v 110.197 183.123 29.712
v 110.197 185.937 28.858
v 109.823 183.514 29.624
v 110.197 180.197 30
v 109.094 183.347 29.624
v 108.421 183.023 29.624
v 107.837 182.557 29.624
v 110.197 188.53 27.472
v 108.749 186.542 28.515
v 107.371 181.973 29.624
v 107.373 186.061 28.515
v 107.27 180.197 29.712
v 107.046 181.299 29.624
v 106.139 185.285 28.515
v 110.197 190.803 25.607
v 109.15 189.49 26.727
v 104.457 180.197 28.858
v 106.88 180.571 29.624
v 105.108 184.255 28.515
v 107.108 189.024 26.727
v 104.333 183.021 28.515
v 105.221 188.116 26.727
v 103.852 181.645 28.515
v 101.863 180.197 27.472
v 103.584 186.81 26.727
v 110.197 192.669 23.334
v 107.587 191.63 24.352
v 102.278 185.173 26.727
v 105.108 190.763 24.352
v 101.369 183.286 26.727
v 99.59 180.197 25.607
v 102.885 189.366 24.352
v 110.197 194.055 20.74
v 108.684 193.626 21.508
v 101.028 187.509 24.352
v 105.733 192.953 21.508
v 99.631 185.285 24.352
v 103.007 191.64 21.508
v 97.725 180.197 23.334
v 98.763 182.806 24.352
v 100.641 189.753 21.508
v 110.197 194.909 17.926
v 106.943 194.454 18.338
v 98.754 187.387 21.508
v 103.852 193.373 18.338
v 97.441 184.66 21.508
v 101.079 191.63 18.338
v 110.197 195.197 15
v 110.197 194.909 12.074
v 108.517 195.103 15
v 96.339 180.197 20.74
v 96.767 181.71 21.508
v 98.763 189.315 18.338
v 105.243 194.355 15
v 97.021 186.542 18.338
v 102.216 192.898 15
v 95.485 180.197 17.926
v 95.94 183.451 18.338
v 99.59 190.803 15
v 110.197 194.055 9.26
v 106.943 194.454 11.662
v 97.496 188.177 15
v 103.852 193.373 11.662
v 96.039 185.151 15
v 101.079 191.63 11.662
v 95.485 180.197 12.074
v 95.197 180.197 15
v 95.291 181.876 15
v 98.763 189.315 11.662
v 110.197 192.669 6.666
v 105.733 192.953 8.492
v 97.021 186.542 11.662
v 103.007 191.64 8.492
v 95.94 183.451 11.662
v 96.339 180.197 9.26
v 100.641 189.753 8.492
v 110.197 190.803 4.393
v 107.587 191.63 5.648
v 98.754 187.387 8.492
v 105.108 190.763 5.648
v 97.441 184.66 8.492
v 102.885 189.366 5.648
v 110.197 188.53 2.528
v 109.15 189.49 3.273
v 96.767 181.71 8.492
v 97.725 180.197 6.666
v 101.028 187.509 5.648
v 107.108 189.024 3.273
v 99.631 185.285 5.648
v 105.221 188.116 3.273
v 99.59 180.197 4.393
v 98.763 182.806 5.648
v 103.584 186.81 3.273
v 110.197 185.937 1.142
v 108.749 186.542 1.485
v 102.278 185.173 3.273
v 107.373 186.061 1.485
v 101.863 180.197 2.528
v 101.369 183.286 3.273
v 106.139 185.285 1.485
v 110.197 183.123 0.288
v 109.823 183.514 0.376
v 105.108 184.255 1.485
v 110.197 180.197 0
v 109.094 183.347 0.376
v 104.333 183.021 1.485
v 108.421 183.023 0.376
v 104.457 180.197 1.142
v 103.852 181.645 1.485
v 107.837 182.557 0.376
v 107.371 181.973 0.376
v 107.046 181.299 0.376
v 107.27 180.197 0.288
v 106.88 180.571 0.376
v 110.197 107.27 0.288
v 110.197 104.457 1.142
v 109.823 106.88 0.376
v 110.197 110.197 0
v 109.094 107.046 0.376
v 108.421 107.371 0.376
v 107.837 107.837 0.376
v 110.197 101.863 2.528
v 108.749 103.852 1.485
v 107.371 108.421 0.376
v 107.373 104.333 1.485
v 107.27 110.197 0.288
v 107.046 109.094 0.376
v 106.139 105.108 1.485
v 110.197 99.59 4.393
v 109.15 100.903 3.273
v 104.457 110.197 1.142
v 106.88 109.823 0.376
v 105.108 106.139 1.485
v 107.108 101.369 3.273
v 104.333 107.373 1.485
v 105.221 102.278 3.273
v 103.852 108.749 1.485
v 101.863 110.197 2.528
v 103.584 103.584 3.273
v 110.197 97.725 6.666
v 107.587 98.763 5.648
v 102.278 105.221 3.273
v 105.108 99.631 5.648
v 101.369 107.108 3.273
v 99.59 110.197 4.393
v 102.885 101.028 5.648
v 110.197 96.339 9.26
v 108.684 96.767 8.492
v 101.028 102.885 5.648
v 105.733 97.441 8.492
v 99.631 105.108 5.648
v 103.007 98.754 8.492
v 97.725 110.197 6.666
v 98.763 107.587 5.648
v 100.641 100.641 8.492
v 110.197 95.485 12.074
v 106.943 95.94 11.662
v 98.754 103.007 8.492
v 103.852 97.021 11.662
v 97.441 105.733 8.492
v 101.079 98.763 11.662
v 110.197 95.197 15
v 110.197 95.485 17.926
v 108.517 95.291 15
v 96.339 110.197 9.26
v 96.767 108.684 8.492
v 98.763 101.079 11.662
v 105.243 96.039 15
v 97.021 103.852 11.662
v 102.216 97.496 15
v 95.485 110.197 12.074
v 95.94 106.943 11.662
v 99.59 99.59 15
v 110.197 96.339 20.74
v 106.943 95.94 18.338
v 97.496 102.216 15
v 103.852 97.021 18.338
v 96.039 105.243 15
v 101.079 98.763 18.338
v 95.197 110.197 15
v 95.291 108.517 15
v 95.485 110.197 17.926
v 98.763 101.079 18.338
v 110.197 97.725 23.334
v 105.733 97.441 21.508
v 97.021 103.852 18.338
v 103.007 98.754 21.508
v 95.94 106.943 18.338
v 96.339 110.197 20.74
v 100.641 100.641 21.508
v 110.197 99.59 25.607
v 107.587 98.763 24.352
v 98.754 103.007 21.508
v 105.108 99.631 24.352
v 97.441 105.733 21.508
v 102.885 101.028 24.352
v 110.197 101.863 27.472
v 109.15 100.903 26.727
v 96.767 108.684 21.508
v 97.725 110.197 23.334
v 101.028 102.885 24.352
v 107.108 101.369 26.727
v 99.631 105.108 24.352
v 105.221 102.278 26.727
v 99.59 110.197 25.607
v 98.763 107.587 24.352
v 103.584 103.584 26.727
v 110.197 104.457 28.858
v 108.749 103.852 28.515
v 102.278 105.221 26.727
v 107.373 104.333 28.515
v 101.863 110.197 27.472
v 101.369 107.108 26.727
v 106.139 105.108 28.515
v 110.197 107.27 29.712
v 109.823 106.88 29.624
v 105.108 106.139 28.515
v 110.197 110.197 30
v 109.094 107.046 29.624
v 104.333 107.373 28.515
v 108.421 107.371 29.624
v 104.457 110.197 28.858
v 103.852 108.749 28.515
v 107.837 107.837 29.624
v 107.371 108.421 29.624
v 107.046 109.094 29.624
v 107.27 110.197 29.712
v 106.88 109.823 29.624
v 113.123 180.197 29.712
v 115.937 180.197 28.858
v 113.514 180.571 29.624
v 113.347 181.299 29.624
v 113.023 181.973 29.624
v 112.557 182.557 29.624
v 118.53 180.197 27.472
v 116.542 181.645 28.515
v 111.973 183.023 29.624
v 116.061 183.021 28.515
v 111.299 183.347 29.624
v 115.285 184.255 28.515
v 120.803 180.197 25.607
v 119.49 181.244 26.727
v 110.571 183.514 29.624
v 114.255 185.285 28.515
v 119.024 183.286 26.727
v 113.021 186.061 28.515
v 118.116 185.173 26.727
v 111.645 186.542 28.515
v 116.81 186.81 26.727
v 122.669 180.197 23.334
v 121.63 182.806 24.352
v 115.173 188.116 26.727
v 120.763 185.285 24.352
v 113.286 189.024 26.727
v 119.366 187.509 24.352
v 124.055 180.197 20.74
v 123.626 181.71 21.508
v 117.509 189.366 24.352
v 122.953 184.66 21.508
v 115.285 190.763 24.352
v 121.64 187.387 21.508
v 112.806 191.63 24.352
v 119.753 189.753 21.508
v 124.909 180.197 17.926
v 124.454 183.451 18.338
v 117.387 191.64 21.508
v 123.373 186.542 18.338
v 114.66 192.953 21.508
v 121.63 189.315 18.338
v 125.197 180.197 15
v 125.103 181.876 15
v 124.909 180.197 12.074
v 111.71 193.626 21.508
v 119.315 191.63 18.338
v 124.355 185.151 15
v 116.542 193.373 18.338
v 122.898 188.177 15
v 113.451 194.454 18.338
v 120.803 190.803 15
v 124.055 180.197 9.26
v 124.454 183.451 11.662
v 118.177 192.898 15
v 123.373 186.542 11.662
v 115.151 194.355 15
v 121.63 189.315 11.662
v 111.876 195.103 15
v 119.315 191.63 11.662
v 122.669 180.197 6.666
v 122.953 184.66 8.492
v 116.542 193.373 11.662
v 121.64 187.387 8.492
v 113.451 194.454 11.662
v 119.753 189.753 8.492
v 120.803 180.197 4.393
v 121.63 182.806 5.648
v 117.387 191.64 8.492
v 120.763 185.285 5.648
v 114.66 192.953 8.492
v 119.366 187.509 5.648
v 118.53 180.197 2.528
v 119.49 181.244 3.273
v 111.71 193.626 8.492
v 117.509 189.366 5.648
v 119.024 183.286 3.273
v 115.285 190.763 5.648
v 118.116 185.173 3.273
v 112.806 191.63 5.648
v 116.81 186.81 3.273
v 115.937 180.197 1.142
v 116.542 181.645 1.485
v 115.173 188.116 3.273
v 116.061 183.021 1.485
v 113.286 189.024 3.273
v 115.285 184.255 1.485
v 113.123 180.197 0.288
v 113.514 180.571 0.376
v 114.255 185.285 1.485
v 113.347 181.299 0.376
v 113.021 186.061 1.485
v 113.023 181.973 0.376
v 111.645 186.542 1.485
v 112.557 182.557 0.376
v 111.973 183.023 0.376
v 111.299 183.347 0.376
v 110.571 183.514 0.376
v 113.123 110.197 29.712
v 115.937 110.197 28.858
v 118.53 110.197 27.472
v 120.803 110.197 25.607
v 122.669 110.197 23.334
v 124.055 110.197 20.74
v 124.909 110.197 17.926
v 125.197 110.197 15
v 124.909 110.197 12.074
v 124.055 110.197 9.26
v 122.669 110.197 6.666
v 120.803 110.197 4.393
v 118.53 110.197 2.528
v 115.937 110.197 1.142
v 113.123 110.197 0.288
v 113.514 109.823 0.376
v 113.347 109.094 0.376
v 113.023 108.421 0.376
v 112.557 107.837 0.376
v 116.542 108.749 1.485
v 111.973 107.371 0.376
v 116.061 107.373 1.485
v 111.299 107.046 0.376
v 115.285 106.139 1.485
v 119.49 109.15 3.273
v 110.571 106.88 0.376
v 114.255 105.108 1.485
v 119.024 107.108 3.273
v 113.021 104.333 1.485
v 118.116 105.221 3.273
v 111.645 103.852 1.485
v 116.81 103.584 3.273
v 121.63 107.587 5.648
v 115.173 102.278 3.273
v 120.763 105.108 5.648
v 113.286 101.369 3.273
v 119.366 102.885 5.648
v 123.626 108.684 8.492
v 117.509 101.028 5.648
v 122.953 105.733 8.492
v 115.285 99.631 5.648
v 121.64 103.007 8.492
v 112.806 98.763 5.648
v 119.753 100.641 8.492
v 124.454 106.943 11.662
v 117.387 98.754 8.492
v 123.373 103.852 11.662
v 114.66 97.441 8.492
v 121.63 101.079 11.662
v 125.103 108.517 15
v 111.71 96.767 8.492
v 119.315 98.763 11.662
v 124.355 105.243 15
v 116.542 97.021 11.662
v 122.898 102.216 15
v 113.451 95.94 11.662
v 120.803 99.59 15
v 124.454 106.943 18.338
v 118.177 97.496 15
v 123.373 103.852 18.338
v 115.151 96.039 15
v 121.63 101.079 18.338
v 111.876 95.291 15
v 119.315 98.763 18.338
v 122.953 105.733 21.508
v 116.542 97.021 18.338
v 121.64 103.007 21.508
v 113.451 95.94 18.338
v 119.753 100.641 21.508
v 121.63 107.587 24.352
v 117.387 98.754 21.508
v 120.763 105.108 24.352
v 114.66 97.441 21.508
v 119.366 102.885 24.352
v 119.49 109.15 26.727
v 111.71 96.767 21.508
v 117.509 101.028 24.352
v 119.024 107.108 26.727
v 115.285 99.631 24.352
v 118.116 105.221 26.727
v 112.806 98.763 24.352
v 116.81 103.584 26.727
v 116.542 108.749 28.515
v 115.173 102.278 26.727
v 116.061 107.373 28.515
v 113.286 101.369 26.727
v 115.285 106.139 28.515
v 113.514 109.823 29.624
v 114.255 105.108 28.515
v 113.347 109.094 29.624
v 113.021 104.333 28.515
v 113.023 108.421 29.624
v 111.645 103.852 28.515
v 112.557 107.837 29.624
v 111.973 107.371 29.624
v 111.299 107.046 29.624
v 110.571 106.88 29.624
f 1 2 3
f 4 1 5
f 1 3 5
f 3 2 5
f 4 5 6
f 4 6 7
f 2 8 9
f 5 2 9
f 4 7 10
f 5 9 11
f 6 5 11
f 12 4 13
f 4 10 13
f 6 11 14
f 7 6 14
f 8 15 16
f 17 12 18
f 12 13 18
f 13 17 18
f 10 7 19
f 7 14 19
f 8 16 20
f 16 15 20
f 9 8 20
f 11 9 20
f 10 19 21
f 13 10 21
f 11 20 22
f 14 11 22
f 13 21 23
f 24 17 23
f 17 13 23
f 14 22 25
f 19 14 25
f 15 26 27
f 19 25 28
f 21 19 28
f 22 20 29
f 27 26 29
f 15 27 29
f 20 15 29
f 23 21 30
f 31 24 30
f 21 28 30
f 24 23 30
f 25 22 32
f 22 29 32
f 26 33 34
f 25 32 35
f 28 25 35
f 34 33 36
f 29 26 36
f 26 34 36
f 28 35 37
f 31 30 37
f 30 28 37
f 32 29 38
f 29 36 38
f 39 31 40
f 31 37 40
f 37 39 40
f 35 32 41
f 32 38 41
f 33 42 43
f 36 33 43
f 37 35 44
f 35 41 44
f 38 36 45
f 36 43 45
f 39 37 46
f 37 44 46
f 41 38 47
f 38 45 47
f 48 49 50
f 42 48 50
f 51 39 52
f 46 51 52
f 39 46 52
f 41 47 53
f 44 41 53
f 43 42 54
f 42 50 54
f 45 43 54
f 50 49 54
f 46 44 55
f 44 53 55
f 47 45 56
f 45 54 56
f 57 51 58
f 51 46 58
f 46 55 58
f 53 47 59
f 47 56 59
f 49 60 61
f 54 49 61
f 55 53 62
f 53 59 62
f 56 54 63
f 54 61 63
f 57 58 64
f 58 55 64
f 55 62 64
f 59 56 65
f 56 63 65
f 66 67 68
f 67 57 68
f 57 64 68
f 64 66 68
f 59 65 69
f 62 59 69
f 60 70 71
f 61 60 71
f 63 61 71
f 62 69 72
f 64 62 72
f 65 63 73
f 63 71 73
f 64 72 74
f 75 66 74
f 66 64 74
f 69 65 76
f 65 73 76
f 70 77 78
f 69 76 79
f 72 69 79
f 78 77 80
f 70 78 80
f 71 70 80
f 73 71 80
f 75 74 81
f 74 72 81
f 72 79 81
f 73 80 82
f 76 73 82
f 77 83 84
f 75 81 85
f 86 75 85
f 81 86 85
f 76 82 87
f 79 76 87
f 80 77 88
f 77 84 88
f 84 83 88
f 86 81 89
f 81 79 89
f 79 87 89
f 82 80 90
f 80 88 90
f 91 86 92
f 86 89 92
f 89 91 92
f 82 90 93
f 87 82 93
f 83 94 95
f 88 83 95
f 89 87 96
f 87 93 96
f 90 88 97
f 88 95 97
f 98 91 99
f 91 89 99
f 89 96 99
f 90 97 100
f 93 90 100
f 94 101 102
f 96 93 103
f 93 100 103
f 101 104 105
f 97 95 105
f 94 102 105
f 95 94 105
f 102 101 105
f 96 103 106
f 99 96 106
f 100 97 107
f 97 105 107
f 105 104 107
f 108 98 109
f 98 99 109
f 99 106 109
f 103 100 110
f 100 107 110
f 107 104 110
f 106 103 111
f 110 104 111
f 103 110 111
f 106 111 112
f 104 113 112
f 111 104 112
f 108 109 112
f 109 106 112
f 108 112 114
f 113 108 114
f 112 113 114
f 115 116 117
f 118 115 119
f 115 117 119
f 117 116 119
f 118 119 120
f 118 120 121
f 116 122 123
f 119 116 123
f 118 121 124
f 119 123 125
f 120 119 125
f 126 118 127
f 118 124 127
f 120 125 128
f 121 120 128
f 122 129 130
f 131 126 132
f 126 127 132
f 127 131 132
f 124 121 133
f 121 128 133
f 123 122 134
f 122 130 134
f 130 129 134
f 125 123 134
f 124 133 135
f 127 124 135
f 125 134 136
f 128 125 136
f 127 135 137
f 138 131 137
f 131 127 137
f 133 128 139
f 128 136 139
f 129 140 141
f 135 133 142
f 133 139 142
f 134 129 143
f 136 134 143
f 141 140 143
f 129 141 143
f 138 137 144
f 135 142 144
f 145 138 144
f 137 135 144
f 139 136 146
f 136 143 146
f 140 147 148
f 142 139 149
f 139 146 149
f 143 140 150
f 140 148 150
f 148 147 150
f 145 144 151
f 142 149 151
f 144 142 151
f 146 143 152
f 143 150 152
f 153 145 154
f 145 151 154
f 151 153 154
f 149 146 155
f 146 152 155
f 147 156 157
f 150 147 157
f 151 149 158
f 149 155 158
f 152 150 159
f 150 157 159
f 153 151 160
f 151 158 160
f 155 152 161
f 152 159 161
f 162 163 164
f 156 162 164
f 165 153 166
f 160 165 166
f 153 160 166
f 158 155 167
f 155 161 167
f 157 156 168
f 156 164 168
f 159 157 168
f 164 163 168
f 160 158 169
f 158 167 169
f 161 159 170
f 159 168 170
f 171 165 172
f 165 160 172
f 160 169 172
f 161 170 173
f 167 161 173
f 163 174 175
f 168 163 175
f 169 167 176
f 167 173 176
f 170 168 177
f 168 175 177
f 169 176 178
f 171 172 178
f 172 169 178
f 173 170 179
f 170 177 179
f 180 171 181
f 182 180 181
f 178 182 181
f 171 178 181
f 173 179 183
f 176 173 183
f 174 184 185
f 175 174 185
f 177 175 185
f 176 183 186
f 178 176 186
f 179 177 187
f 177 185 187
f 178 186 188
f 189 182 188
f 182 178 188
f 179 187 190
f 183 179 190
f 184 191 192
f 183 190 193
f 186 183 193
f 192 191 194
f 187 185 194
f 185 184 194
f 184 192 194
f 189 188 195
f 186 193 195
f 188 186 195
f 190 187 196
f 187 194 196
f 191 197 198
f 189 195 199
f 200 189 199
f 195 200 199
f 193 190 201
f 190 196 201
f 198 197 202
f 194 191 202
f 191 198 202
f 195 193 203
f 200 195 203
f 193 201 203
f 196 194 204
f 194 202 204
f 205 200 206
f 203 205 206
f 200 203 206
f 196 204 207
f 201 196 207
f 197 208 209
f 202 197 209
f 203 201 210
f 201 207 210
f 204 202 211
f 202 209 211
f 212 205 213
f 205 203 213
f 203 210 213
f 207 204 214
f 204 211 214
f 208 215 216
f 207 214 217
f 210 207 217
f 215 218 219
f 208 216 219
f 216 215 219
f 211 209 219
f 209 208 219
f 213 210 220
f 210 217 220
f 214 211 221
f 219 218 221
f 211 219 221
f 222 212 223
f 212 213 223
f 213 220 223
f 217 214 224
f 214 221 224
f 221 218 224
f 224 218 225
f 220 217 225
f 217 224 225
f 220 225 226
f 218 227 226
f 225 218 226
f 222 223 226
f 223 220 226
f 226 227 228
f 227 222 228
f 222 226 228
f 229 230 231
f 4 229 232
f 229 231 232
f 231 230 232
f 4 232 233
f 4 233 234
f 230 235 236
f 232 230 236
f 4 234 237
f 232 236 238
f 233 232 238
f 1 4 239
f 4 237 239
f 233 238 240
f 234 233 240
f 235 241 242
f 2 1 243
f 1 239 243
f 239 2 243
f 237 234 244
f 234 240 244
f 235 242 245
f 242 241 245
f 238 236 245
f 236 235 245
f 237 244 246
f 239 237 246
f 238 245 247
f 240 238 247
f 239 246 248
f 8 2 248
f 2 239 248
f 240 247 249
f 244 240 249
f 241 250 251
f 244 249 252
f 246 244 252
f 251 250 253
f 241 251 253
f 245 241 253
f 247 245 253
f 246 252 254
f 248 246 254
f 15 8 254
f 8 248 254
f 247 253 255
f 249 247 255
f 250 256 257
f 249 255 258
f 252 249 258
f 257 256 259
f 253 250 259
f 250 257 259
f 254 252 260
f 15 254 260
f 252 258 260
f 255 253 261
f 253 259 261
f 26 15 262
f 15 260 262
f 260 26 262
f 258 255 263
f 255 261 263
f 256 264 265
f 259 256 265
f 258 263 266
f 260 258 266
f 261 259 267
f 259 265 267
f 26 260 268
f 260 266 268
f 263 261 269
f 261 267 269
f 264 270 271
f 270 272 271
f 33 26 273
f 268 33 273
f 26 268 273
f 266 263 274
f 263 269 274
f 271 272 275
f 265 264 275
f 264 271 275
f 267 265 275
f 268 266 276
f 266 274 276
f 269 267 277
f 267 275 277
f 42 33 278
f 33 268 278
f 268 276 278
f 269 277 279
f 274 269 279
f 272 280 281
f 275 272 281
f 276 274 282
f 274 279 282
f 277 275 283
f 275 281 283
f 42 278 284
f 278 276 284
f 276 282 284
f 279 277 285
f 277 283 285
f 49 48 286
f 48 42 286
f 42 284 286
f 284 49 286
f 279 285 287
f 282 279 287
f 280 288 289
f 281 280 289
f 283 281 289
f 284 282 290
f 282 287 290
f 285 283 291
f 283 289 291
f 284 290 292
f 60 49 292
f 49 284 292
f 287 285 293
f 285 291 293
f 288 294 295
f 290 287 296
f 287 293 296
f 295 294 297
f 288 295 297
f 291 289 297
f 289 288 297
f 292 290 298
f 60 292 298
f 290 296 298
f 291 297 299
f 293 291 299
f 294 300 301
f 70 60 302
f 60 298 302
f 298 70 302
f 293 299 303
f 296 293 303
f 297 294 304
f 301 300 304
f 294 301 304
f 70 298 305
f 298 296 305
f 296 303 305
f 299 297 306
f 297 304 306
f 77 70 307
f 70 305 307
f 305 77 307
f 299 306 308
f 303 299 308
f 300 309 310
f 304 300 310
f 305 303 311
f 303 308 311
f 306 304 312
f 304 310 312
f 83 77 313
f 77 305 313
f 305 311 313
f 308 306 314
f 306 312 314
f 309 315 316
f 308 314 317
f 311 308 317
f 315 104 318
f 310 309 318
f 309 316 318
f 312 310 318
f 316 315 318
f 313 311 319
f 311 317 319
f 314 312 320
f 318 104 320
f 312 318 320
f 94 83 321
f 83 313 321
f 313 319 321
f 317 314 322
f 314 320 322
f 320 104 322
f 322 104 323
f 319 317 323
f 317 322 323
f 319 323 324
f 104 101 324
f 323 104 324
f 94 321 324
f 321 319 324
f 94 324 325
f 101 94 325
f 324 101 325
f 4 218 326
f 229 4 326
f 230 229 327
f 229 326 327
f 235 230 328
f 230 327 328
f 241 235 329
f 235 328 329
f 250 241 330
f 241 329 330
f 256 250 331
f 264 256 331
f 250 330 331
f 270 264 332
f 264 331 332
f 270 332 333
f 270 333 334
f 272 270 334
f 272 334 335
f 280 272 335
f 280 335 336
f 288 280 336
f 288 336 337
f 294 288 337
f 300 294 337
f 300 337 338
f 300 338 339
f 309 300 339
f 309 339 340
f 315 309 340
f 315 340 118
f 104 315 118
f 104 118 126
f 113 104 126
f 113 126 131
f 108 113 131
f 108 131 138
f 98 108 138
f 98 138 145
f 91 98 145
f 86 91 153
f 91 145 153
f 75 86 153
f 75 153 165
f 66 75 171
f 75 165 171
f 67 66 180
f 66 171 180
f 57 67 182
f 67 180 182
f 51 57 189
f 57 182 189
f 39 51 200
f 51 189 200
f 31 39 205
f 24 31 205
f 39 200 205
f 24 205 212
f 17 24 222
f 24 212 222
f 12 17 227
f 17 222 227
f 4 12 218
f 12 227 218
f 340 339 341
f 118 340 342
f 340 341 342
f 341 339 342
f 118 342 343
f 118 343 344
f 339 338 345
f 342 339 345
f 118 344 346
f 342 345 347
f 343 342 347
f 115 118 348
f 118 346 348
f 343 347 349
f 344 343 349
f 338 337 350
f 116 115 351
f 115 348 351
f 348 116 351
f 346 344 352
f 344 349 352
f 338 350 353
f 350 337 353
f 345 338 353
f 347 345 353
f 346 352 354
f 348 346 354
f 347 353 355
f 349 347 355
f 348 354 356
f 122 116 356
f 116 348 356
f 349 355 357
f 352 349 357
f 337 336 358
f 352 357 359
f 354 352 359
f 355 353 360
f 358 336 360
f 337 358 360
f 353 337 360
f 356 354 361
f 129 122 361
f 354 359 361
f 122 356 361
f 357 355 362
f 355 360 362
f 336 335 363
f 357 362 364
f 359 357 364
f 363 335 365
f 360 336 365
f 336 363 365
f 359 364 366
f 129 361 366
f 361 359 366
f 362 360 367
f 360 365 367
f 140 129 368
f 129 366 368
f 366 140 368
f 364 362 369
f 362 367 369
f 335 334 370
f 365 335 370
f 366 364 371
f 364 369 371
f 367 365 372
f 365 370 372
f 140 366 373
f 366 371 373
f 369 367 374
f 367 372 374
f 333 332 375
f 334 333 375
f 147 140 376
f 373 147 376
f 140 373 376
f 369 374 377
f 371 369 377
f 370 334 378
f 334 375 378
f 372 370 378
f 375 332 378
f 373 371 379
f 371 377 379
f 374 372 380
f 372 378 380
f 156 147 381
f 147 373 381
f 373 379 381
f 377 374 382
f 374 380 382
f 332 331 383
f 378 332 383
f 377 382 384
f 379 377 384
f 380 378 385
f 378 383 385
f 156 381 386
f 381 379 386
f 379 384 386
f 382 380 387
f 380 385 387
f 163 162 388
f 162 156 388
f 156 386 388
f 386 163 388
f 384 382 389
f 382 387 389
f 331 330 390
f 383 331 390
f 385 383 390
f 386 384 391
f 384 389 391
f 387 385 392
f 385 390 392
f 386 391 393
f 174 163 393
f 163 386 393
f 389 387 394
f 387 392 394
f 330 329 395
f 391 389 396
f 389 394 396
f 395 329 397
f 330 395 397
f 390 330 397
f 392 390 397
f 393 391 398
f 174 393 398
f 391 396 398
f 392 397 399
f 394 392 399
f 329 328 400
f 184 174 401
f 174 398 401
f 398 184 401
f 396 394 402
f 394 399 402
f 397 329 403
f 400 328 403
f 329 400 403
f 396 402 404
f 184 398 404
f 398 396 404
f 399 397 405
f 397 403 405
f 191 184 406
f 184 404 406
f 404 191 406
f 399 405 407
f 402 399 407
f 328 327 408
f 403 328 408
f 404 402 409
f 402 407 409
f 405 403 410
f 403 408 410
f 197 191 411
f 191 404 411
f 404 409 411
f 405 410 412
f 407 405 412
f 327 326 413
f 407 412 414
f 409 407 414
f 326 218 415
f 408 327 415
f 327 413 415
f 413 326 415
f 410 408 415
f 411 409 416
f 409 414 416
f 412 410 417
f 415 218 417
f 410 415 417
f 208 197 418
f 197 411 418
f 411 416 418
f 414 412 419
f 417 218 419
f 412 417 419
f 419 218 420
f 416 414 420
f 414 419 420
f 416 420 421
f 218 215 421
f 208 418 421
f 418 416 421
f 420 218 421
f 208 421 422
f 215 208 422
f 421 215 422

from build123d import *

# Parameters (mm, degrees)
SKETCH1_R           = 15
BOSS_EXTRUDE1_DEPTH = 70


with BuildPart() as part:
    # Sketch1 → Boss-Extrude1 (new body)
    with BuildSketch(Plane(origin=(0, 110.196823778, 0), x_dir=(1, 0, 0), z_dir=(0, 1, 0))):
        with Locations((110.196823778, -15)):
            Circle(SKETCH1_R)
    extrude(amount=BOSS_EXTRUDE1_DEPTH)

    # Sketch2 → Revolve1 (revolve)
    with BuildSketch(Plane(origin=(110.196823778, 0, 0), x_dir=(0, 0, -1), z_dir=(1, 0, 0))):
        with BuildLine():
            Line((-30, 180.196823778), (0, 180.196823778))
            ThreePointArc((0, 180.196823778), (-15, 195.196823778), (-30, 180.196823778))
        make_face()
    revolve(axis=Axis((110.196823778, 180.196823778, 0), (0, 0, 1)))

    # Sketch2<3> → Revolve2 (revolve)
    with BuildSketch(Plane(origin=(110.196823778, 0, 0), x_dir=(0, 0, -1), z_dir=(1, 0, 0))):
        with BuildLine():
            Line((0, 110.196823778), (-30, 110.196823778))
            ThreePointArc((-30, 110.196823778), (-15, 95.196823778), (0, 110.196823778))
        make_face()
    revolve(axis=Axis((110.196823778, 110.196823778, 30), (0, 0, -1)))


solid = part.part
